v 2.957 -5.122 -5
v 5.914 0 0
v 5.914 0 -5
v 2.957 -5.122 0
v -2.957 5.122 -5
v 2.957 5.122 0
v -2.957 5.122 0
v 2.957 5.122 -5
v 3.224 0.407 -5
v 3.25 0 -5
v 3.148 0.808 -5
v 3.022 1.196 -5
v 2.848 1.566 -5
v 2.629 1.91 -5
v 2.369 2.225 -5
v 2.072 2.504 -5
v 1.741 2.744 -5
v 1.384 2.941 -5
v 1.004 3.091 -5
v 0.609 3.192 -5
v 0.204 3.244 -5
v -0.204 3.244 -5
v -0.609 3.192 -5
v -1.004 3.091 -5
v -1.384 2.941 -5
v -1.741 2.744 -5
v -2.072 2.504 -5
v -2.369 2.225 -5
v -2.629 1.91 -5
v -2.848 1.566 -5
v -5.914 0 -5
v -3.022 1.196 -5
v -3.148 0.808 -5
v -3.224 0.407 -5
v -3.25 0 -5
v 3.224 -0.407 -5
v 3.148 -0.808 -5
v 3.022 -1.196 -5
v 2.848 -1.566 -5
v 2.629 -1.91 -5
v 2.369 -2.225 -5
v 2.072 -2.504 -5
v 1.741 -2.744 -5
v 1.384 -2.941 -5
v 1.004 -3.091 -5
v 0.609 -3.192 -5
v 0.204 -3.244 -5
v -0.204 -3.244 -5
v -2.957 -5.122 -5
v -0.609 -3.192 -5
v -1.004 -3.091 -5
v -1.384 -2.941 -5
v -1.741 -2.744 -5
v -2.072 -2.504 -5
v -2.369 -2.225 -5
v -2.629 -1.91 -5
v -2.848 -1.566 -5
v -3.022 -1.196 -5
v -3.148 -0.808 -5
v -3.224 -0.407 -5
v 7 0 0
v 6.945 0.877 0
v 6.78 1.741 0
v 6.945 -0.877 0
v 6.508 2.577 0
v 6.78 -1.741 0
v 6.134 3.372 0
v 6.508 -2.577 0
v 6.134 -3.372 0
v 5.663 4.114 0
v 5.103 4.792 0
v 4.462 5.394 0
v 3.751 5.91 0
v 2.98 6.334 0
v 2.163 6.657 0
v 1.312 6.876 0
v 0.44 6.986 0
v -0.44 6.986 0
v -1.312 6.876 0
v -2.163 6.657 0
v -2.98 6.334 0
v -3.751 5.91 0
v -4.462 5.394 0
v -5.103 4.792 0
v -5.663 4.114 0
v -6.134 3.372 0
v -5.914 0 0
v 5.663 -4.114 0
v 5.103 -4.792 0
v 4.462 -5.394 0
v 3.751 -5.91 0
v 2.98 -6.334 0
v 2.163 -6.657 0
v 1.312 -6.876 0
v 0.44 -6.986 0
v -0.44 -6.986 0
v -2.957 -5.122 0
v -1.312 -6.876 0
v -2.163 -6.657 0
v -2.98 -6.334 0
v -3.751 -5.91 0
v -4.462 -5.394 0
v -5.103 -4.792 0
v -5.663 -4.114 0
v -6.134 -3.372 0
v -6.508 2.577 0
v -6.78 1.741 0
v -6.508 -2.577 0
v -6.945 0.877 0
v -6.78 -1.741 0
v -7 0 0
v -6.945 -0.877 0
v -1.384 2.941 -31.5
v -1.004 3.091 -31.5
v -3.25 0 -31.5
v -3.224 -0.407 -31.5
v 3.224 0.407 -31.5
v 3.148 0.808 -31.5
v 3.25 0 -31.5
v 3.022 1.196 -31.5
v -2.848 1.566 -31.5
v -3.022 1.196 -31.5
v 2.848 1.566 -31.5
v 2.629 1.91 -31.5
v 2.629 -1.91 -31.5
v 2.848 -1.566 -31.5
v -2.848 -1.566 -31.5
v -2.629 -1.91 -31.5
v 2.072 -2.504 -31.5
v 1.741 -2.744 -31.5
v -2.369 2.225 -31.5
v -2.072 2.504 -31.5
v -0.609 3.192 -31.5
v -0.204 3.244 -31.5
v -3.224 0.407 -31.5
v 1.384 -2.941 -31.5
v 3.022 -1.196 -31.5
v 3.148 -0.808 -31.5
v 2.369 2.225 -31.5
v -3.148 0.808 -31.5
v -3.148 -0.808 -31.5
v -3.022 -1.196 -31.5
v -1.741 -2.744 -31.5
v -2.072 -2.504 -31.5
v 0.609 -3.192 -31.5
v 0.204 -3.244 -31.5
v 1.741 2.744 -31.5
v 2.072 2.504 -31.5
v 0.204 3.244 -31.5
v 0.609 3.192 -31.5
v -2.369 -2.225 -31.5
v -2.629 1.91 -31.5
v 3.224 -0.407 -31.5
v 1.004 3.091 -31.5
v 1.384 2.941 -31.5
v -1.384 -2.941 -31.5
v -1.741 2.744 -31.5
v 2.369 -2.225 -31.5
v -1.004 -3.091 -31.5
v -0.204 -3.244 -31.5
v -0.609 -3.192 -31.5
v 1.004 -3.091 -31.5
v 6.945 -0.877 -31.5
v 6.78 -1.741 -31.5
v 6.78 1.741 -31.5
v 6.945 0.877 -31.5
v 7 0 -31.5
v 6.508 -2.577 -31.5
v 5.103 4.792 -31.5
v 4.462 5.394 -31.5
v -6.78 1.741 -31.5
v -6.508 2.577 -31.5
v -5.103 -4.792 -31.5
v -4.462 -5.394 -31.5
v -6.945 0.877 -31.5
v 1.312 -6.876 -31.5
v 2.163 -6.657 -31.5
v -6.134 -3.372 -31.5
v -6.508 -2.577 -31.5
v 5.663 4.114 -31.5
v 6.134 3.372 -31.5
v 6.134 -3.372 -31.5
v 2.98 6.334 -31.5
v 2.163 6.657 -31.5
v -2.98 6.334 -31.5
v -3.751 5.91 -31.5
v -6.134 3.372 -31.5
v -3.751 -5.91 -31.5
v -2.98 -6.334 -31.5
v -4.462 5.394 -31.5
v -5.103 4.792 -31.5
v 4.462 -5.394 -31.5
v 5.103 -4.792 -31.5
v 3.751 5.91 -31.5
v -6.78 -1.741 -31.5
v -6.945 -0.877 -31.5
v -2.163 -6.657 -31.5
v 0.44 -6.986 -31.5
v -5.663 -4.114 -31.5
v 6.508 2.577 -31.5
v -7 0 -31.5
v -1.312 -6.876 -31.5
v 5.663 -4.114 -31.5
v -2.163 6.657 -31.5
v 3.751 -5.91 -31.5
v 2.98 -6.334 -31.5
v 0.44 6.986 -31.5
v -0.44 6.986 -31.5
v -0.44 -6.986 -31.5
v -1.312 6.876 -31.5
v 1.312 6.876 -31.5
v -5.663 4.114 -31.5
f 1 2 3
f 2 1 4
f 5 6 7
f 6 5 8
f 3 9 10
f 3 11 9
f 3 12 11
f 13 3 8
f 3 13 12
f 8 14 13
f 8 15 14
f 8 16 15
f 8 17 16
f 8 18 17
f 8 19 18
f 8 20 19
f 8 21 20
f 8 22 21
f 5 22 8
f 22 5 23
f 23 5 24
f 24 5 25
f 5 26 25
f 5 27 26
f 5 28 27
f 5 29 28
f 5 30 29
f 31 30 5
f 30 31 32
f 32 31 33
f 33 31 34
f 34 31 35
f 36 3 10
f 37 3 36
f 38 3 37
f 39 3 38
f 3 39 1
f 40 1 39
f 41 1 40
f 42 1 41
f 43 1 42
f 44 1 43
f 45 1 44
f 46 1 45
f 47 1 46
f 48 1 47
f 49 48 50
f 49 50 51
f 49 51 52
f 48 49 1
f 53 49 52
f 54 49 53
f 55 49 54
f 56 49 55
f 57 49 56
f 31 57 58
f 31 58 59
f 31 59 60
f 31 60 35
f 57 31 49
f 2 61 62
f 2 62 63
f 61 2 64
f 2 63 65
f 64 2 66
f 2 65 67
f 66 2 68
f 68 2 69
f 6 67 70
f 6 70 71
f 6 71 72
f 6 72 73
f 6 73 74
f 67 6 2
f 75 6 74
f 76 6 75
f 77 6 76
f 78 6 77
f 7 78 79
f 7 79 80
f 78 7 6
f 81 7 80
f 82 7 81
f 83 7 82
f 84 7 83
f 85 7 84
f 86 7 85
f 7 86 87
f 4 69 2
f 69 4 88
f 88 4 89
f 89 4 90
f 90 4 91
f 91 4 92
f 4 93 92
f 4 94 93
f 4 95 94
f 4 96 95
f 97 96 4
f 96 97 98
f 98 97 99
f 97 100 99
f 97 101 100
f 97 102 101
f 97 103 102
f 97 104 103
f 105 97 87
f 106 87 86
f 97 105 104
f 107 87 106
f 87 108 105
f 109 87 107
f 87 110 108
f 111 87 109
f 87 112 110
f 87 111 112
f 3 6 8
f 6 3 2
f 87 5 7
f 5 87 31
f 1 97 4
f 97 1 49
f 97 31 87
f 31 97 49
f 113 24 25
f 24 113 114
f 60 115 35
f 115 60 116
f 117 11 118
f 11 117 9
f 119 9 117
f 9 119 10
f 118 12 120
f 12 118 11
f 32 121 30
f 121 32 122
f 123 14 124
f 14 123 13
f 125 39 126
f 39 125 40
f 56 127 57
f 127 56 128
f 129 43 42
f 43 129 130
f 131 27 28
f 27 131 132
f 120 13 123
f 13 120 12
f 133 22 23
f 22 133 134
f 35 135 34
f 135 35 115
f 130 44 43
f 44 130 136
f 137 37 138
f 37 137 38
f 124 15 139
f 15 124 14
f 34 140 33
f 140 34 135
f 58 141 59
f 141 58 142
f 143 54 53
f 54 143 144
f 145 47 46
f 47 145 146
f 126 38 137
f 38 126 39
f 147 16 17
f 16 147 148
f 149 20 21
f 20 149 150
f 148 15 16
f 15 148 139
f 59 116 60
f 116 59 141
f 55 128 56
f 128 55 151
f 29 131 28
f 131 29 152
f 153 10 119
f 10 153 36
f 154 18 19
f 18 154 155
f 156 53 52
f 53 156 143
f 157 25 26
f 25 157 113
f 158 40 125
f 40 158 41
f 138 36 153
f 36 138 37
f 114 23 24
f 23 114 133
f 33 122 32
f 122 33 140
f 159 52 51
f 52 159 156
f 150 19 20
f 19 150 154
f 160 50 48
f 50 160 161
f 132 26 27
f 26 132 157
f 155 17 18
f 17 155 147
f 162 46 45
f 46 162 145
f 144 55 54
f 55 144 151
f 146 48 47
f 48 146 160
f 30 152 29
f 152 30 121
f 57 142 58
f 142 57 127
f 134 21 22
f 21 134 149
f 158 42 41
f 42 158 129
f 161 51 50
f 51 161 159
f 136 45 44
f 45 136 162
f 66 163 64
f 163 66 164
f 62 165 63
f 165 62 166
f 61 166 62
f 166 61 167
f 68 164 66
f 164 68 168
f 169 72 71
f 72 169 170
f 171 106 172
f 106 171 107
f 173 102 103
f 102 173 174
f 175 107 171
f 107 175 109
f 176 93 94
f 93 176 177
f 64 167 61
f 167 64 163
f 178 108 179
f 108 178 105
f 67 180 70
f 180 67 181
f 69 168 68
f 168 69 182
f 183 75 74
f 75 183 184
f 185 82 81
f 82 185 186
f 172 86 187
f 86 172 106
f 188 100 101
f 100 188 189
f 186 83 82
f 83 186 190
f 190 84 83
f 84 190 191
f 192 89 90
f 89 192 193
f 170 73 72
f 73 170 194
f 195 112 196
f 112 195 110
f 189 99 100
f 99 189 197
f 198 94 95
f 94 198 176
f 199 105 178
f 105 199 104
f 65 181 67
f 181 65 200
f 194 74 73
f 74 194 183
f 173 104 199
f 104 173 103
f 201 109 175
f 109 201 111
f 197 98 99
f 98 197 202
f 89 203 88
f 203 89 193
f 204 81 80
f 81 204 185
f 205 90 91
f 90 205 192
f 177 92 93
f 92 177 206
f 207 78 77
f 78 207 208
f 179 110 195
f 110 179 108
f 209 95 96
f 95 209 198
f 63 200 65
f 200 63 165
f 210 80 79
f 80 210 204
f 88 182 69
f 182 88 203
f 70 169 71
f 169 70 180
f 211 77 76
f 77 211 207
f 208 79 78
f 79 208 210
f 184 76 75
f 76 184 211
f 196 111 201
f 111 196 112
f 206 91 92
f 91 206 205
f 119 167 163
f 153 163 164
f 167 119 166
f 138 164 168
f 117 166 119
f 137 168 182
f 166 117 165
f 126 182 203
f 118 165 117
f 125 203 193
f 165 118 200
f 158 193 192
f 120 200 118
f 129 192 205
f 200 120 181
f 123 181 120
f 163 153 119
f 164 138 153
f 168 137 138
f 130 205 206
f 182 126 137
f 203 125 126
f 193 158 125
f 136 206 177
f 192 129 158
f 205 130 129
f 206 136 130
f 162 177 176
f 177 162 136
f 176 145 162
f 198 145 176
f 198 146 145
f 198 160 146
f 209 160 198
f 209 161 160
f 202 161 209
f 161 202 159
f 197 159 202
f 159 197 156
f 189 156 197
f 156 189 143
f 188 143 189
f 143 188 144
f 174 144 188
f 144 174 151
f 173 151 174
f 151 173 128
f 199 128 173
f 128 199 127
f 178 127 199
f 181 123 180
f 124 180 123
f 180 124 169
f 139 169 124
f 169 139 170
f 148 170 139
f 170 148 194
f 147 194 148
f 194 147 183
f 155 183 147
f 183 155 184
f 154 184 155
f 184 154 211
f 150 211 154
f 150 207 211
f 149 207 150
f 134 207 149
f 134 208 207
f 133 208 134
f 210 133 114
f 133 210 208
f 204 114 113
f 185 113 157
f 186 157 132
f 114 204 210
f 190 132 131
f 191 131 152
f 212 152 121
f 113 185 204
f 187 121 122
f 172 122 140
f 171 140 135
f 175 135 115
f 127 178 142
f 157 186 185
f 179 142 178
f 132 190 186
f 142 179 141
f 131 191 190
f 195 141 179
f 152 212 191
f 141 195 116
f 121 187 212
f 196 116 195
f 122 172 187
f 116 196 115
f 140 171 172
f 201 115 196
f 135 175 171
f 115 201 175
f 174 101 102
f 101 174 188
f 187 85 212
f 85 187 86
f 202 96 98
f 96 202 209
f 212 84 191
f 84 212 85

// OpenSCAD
$fn = 50;


difference() {
	union() {
		translate(v = [0, 0, -31.5000000000]) {
			cylinder(h = 31.5000000000, r = 7.0000000000);
		}
	}
	union() {
		translate(v = [0, 0, 0]) {
			rotate(a = [0, 0, 0]) {
				difference() {
					union() {
						translate(v = [0, 0, -5]) {
							linear_extrude(height = 5) {
								polygon(points = [[5.9142500000, 0.0000000000], [2.9571250000, 5.1218907443], [-2.9571250000, 5.1218907443], [-5.9142500000, 0.0000000000], [-2.9571250000, -5.1218907443], [2.9571250000, -5.1218907443]]);
							}
						}
					}
					union();
				}
			}
		}
		#translate(v = [0, 0, -100.0000000000]) {
			cylinder(h = 200, r = 3.2500000000);
		}
	}
}
